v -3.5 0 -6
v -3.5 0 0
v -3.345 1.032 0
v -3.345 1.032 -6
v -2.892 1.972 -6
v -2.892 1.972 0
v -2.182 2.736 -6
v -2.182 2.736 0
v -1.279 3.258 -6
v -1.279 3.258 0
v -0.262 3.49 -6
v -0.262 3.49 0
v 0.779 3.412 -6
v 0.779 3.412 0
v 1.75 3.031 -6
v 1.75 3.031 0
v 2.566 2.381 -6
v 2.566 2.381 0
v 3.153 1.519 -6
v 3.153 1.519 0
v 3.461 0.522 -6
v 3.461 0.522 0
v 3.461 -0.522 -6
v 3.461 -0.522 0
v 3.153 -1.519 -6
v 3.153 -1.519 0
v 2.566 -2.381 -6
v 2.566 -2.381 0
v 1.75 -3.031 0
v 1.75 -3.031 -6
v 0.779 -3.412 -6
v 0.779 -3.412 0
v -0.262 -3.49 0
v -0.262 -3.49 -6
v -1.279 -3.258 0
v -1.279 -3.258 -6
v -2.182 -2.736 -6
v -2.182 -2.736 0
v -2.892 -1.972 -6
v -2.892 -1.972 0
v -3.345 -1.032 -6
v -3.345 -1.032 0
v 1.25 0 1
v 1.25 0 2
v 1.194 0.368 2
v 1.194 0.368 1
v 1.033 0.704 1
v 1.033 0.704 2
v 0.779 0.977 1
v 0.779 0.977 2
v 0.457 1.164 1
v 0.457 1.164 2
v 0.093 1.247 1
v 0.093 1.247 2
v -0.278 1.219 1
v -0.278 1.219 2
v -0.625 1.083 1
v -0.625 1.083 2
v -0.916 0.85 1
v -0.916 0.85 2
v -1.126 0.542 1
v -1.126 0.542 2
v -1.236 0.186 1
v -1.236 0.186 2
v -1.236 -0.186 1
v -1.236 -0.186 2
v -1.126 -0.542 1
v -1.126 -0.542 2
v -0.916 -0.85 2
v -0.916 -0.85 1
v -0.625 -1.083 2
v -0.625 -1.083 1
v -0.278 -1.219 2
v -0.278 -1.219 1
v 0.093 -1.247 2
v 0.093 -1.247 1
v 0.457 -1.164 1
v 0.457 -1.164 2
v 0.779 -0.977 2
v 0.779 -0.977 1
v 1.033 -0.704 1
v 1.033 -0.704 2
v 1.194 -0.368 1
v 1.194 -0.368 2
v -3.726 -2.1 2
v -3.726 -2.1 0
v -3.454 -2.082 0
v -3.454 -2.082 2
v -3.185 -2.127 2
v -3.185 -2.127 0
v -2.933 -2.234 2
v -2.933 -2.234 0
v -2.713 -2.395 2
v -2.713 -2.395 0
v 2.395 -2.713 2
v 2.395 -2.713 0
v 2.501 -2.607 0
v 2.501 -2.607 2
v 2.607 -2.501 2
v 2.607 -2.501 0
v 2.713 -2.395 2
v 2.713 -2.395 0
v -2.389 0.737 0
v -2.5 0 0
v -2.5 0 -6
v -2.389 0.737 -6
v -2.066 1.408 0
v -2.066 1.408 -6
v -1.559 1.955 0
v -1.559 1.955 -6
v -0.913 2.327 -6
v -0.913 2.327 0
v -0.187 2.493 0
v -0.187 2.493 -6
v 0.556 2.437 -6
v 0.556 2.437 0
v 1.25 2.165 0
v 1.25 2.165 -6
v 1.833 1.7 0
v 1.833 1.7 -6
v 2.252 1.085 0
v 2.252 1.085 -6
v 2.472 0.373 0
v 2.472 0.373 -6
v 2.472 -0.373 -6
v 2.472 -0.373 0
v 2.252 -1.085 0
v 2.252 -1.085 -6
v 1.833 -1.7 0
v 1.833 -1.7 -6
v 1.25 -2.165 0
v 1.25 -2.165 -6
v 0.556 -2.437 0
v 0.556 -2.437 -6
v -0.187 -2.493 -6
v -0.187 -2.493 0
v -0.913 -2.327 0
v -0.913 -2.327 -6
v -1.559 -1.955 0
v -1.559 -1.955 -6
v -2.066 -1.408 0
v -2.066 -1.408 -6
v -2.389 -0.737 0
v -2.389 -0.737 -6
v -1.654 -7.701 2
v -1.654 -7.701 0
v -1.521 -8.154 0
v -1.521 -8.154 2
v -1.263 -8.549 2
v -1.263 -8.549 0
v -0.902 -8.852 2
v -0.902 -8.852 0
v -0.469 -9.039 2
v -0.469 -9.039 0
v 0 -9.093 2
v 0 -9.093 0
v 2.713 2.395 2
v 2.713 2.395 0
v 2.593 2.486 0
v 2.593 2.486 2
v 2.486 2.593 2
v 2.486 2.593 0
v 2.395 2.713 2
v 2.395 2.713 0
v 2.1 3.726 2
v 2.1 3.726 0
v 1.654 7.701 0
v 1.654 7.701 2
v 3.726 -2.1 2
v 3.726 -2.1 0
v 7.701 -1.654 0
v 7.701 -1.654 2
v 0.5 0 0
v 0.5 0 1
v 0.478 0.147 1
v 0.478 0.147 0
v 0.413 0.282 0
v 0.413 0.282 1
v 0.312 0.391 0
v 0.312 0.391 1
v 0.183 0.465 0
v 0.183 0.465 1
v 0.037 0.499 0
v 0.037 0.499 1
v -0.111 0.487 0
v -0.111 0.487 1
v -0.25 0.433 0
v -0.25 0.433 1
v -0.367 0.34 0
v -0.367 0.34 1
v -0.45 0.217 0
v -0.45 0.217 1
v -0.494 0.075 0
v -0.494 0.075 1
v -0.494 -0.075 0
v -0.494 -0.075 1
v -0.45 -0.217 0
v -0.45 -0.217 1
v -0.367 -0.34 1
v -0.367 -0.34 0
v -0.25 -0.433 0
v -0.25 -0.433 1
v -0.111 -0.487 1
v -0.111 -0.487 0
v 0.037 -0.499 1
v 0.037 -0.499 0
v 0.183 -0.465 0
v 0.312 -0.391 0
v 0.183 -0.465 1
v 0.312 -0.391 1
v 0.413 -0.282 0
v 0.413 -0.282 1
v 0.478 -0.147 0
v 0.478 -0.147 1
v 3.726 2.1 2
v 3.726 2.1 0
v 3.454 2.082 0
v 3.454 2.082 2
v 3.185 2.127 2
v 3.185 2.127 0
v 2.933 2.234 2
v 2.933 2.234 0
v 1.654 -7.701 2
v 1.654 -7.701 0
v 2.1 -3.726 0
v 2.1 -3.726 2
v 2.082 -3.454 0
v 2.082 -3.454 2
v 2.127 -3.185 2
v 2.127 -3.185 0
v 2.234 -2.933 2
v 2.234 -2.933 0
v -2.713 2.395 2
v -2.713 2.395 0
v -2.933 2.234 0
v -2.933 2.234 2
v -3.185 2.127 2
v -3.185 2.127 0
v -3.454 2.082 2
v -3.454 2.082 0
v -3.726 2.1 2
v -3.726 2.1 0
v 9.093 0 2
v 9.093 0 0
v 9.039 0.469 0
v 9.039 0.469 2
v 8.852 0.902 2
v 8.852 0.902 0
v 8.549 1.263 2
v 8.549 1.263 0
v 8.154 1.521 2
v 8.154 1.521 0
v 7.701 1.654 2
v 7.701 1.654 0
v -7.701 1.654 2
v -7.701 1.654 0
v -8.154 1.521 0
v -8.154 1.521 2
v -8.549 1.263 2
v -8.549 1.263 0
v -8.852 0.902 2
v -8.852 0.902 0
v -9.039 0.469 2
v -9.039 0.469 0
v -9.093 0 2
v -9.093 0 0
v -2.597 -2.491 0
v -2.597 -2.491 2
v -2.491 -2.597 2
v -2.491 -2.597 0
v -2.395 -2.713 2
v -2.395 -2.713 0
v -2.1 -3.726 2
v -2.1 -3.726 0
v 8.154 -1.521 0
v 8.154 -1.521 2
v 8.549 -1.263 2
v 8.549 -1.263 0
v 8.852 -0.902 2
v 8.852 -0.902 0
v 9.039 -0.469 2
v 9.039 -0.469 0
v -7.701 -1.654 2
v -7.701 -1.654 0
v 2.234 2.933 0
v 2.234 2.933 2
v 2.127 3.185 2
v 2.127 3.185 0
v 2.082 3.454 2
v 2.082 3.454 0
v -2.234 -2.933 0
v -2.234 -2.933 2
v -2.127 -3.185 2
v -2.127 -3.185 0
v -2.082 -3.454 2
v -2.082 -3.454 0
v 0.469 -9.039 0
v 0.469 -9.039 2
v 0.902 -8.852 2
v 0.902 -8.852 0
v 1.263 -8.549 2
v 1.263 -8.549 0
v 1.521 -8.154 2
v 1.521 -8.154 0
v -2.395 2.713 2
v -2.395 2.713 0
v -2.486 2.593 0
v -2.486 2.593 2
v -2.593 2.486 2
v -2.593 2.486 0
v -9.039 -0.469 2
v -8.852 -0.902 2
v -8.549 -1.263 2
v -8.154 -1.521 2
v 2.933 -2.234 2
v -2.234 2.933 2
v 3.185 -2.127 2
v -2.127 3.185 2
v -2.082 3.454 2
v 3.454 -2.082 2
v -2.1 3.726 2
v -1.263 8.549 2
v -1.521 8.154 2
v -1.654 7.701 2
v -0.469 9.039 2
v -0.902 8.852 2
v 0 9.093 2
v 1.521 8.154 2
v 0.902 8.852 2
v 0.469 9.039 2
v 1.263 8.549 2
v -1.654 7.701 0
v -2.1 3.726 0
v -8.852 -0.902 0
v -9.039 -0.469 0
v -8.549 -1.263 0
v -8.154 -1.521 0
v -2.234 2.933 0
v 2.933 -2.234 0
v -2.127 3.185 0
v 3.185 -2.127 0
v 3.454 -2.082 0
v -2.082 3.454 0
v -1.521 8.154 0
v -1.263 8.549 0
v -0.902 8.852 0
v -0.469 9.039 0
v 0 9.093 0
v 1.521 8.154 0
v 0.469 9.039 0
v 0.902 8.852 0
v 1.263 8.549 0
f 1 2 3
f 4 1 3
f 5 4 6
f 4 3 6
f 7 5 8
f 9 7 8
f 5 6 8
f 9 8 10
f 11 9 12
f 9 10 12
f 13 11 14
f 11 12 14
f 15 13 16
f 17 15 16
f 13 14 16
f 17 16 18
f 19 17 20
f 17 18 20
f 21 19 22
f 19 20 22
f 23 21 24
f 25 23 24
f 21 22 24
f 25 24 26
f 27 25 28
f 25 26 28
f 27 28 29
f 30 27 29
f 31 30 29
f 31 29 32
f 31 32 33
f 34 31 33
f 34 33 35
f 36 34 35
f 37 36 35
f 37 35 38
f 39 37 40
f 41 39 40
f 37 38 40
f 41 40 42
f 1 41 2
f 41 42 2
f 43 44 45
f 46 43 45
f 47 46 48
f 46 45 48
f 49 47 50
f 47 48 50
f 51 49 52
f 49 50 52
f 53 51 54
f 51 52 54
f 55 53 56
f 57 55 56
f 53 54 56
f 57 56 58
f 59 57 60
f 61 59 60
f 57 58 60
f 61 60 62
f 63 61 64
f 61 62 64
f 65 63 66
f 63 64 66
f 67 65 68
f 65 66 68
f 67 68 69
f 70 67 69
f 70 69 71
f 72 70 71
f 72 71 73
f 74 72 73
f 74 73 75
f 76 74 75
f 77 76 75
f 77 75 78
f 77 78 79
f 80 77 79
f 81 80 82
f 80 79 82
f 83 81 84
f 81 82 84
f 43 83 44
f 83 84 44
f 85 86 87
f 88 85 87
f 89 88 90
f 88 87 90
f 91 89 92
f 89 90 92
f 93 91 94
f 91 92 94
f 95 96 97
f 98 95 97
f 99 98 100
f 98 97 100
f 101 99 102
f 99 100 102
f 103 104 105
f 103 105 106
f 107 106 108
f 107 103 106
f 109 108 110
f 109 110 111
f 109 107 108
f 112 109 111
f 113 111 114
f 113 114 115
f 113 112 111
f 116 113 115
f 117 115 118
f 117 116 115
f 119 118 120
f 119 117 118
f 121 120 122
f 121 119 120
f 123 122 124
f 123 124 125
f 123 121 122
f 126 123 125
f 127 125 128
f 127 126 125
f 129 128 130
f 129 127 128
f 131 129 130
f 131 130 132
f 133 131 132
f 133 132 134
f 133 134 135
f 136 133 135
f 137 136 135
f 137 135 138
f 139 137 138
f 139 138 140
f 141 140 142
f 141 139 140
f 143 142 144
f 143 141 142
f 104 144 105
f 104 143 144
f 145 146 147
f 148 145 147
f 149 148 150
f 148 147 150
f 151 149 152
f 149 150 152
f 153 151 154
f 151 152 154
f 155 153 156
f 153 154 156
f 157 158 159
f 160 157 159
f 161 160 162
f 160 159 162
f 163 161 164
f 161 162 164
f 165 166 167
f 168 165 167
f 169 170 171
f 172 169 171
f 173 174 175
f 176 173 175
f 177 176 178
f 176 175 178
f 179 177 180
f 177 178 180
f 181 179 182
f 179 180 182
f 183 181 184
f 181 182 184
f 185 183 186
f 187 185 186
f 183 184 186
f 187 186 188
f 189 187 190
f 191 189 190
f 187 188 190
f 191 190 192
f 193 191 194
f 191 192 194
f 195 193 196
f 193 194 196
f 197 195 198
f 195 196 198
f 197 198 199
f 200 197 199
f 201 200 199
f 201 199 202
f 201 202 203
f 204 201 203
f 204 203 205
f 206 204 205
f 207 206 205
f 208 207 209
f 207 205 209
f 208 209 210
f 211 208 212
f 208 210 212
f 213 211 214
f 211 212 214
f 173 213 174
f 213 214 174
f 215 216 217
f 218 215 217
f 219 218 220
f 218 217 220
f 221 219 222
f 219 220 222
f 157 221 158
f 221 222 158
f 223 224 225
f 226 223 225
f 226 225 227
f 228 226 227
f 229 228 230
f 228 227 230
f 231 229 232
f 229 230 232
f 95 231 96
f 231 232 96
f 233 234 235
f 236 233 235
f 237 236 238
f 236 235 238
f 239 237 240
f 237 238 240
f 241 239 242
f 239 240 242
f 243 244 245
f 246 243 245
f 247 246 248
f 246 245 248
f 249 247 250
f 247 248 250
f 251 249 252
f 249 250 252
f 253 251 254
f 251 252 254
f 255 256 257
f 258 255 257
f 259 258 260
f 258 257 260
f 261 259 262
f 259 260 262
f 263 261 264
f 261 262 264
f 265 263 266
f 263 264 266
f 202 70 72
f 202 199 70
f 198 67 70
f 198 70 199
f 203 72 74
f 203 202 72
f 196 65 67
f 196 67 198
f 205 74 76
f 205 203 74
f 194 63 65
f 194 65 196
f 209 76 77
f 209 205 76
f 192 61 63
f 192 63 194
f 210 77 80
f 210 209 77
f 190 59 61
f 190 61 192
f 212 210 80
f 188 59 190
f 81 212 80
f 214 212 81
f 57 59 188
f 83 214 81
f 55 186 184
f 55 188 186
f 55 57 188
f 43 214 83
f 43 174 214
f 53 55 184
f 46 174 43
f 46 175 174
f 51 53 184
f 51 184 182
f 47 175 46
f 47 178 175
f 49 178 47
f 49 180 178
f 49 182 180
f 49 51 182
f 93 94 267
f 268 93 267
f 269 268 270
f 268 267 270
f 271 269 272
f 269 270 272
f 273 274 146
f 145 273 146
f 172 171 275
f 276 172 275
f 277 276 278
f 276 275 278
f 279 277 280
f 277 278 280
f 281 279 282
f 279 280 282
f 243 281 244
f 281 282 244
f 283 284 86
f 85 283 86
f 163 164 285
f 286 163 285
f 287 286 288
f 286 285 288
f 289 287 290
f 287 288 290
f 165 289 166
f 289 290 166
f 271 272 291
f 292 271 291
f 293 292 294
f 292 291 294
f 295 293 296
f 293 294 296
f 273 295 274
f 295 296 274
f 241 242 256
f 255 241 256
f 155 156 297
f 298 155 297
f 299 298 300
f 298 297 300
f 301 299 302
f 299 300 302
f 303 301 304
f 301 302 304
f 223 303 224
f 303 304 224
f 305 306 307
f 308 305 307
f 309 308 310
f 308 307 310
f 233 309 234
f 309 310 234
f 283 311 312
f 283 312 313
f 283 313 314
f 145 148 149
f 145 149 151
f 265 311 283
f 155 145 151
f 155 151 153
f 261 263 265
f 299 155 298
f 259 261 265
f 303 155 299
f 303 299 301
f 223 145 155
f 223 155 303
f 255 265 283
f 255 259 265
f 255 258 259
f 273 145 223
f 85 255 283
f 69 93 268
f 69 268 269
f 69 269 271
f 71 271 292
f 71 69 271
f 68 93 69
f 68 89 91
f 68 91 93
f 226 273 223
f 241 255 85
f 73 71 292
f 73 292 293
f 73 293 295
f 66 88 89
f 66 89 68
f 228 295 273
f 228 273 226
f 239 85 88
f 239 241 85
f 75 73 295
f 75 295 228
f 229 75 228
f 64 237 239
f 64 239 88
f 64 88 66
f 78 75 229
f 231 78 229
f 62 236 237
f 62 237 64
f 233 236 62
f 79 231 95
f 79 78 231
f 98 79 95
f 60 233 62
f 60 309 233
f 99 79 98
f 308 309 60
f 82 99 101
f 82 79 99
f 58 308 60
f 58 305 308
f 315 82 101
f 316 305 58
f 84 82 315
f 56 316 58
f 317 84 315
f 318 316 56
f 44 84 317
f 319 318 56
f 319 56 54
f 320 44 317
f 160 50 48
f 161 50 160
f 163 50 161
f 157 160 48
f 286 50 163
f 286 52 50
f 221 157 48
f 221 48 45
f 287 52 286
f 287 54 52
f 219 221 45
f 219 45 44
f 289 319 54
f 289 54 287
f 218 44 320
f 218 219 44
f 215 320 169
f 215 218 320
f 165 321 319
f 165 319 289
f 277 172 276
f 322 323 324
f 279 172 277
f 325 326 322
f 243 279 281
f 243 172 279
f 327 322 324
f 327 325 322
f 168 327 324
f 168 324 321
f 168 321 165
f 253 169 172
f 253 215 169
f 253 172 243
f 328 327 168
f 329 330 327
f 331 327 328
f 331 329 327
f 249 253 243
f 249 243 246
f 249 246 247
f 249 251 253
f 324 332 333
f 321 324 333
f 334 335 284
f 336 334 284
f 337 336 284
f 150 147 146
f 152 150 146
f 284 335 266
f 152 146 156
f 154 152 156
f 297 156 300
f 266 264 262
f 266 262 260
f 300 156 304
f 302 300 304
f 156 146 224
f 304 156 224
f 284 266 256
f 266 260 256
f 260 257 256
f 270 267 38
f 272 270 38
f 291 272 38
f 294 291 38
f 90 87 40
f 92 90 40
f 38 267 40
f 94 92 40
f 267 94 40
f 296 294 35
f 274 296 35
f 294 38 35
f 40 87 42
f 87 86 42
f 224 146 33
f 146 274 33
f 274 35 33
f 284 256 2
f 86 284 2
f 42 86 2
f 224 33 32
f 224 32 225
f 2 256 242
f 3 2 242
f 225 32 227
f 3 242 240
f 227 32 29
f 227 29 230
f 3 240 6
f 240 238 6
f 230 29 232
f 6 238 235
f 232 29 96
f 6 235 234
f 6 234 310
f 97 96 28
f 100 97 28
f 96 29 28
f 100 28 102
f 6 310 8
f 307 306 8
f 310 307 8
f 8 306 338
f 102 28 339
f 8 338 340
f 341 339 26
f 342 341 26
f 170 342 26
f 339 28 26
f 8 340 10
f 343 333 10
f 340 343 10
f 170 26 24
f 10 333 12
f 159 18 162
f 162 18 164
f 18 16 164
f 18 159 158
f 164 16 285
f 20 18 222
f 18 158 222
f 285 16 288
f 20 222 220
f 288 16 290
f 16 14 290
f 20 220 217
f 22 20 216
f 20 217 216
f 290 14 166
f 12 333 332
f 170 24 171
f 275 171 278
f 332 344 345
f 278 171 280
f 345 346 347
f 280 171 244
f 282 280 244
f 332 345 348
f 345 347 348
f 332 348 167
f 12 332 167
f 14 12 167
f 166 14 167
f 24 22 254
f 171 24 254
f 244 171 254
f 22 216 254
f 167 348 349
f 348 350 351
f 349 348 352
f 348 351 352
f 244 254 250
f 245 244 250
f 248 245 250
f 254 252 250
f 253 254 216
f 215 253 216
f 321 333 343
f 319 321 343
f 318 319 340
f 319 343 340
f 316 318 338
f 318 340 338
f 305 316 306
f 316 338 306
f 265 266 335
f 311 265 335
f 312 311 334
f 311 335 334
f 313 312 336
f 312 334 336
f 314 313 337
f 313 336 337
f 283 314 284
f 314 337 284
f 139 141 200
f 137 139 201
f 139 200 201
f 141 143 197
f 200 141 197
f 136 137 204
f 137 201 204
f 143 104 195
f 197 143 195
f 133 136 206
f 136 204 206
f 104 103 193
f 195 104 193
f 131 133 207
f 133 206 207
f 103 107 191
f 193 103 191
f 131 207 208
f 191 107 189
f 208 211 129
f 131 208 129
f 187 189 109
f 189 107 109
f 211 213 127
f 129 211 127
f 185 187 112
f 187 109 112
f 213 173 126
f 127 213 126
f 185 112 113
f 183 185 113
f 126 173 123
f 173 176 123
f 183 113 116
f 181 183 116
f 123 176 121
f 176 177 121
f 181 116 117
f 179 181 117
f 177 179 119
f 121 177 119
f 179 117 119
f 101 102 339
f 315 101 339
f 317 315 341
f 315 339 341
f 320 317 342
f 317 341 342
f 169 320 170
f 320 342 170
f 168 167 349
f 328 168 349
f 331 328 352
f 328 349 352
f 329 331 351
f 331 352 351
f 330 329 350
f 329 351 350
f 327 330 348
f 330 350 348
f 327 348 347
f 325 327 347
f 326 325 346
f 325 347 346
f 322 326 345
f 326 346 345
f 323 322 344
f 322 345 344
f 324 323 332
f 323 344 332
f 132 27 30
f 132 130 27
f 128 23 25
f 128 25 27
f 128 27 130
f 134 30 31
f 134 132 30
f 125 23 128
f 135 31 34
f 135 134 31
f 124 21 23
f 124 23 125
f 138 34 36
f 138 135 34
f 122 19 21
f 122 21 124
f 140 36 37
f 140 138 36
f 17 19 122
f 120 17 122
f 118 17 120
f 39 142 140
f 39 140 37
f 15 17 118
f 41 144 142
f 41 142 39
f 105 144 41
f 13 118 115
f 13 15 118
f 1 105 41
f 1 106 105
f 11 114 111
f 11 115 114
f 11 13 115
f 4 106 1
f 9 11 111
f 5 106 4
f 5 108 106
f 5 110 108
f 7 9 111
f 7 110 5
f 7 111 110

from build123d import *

# Parameters (mm, degrees)
BOSS_EXTRUDE1_DEPTH = 2
SKETCH2_R           = 3.5
SKETCH2_R_2         = 2.5
BOSS_EXTRUDE2_DEPTH = 6
SKETCH3_R           = 1.25
CUT_EXTRUDE1_DEPTH  = 1
SKETCH4_R           = 0.5
CUT_EXTRUDE2_DEPTH  = 1


with BuildPart() as part:
    # Sketch1 → Boss-Extrude1 (new body)
    with BuildSketch(Plane.XY):
        with BuildLine():
            Line((1.653818246, -7.701405378), (2.100322305, -3.726408024))
            ThreePointArc((2.100322305, -3.726408024), (2.127371286, -3.184526841), (2.395247592, -2.712712102))
            ThreePointArc((2.395247592, -2.712712102), (2.55393801, -2.55393801), (2.712712102, -2.395247592))
            ThreePointArc((2.712712102, -2.395247592), (3.184526841, -2.127371286), (3.726408024, -2.100322305))
            Line((3.726408024, -2.100322305), (7.701405378, -1.653818246))
            ThreePointArc((7.701405378, -1.653818246), (8.713646486, -1.093206236), (9.092879943, 0))
            ThreePointArc((9.092879943, 0), (8.713646486, 1.093206236), (7.701405378, 1.653818246))
            Line((7.701405378, 1.653818246), (3.726408024, 2.100322305))
            ThreePointArc((3.726408024, 2.100322305), (3.184526841, 2.127371286), (2.712712102, 2.395247592))
            ThreePointArc((2.712712102, 2.395247592), (2.537508652, 2.537508652), (2.395247592, 2.712712102))
            ThreePointArc((2.395247592, 2.712712102), (2.127371286, 3.184526841), (2.100322305, 3.726408024))
            Line((2.100322305, 3.726408024), (1.653818246, 7.701405378))
            ThreePointArc((1.653818246, 7.701405378), (1.093206236, 8.713646486), (0, 9.092879943))
            ThreePointArc((0, 9.092879943), (-1.093206236, 8.713646486), (-1.653818246, 7.701405378))
            Line((-1.653818246, 7.701405378), (-2.100322305, 3.726408024))
            ThreePointArc((-2.100322305, 3.726408024), (-2.127371286, 3.184526841), (-2.395247592, 2.712712102))
            ThreePointArc((-2.395247592, 2.712712102), (-2.537508652, 2.537508652), (-2.712712102, 2.395247592))
            ThreePointArc((-2.712712102, 2.395247592), (-3.184526841, 2.127371286), (-3.726408024, 2.100322305))
            Line((-3.726408024, 2.100322305), (-7.701405378, 1.653818246))
            ThreePointArc((-7.701405378, 1.653818246), (-8.713646486, 1.093206236), (-9.092879943, 0))
            ThreePointArc((-9.092879943, 0), (-8.713646486, -1.093206236), (-7.701405378, -1.653818246))
            Line((-7.701405378, -1.653818246), (-3.726408024, -2.100322305))
            ThreePointArc((-3.726408024, -2.100322305), (-3.184526841, -2.127371286), (-2.712712102, -2.395247592))
            ThreePointArc((-2.712712102, -2.395247592), (-2.542453575, -2.542453575), (-2.395247592, -2.712712102))
            ThreePointArc((-2.395247592, -2.712712102), (-2.127371286, -3.184526841), (-2.100322305, -3.726408024))
            Line((-2.100322305, -3.726408024), (-1.653818246, -7.701405378))
            ThreePointArc((-1.653818246, -7.701405378), (-1.093206236, -8.713646486), (0, -9.092879943))
            ThreePointArc((0, -9.092879943), (1.093206236, -8.713646486), (1.653818246, -7.701405378))
        make_face()
    extrude(amount=BOSS_EXTRUDE1_DEPTH)

    # Sketch2 → Boss-Extrude2 (add)
    with BuildSketch(Plane(origin=(0, 0, 0), x_dir=(-1, 0, 0), z_dir=(0, 0, -1))):
        Circle(SKETCH2_R)
        Circle(SKETCH2_R_2, mode=Mode.SUBTRACT)
    extrude(amount=BOSS_EXTRUDE2_DEPTH)

    # Sketch3 → Cut-Extrude1 (cut)
    with BuildSketch(Plane.XY.offset(2)):
        Circle(SKETCH3_R)
    extrude(amount=-CUT_EXTRUDE1_DEPTH, mode=Mode.SUBTRACT)

    # Sketch4 → Cut-Extrude2 (cut)
    with BuildSketch(Plane.XY.offset(1)):
        Circle(SKETCH4_R)
    extrude(amount=-CUT_EXTRUDE2_DEPTH, mode=Mode.SUBTRACT)


solid = part.part
